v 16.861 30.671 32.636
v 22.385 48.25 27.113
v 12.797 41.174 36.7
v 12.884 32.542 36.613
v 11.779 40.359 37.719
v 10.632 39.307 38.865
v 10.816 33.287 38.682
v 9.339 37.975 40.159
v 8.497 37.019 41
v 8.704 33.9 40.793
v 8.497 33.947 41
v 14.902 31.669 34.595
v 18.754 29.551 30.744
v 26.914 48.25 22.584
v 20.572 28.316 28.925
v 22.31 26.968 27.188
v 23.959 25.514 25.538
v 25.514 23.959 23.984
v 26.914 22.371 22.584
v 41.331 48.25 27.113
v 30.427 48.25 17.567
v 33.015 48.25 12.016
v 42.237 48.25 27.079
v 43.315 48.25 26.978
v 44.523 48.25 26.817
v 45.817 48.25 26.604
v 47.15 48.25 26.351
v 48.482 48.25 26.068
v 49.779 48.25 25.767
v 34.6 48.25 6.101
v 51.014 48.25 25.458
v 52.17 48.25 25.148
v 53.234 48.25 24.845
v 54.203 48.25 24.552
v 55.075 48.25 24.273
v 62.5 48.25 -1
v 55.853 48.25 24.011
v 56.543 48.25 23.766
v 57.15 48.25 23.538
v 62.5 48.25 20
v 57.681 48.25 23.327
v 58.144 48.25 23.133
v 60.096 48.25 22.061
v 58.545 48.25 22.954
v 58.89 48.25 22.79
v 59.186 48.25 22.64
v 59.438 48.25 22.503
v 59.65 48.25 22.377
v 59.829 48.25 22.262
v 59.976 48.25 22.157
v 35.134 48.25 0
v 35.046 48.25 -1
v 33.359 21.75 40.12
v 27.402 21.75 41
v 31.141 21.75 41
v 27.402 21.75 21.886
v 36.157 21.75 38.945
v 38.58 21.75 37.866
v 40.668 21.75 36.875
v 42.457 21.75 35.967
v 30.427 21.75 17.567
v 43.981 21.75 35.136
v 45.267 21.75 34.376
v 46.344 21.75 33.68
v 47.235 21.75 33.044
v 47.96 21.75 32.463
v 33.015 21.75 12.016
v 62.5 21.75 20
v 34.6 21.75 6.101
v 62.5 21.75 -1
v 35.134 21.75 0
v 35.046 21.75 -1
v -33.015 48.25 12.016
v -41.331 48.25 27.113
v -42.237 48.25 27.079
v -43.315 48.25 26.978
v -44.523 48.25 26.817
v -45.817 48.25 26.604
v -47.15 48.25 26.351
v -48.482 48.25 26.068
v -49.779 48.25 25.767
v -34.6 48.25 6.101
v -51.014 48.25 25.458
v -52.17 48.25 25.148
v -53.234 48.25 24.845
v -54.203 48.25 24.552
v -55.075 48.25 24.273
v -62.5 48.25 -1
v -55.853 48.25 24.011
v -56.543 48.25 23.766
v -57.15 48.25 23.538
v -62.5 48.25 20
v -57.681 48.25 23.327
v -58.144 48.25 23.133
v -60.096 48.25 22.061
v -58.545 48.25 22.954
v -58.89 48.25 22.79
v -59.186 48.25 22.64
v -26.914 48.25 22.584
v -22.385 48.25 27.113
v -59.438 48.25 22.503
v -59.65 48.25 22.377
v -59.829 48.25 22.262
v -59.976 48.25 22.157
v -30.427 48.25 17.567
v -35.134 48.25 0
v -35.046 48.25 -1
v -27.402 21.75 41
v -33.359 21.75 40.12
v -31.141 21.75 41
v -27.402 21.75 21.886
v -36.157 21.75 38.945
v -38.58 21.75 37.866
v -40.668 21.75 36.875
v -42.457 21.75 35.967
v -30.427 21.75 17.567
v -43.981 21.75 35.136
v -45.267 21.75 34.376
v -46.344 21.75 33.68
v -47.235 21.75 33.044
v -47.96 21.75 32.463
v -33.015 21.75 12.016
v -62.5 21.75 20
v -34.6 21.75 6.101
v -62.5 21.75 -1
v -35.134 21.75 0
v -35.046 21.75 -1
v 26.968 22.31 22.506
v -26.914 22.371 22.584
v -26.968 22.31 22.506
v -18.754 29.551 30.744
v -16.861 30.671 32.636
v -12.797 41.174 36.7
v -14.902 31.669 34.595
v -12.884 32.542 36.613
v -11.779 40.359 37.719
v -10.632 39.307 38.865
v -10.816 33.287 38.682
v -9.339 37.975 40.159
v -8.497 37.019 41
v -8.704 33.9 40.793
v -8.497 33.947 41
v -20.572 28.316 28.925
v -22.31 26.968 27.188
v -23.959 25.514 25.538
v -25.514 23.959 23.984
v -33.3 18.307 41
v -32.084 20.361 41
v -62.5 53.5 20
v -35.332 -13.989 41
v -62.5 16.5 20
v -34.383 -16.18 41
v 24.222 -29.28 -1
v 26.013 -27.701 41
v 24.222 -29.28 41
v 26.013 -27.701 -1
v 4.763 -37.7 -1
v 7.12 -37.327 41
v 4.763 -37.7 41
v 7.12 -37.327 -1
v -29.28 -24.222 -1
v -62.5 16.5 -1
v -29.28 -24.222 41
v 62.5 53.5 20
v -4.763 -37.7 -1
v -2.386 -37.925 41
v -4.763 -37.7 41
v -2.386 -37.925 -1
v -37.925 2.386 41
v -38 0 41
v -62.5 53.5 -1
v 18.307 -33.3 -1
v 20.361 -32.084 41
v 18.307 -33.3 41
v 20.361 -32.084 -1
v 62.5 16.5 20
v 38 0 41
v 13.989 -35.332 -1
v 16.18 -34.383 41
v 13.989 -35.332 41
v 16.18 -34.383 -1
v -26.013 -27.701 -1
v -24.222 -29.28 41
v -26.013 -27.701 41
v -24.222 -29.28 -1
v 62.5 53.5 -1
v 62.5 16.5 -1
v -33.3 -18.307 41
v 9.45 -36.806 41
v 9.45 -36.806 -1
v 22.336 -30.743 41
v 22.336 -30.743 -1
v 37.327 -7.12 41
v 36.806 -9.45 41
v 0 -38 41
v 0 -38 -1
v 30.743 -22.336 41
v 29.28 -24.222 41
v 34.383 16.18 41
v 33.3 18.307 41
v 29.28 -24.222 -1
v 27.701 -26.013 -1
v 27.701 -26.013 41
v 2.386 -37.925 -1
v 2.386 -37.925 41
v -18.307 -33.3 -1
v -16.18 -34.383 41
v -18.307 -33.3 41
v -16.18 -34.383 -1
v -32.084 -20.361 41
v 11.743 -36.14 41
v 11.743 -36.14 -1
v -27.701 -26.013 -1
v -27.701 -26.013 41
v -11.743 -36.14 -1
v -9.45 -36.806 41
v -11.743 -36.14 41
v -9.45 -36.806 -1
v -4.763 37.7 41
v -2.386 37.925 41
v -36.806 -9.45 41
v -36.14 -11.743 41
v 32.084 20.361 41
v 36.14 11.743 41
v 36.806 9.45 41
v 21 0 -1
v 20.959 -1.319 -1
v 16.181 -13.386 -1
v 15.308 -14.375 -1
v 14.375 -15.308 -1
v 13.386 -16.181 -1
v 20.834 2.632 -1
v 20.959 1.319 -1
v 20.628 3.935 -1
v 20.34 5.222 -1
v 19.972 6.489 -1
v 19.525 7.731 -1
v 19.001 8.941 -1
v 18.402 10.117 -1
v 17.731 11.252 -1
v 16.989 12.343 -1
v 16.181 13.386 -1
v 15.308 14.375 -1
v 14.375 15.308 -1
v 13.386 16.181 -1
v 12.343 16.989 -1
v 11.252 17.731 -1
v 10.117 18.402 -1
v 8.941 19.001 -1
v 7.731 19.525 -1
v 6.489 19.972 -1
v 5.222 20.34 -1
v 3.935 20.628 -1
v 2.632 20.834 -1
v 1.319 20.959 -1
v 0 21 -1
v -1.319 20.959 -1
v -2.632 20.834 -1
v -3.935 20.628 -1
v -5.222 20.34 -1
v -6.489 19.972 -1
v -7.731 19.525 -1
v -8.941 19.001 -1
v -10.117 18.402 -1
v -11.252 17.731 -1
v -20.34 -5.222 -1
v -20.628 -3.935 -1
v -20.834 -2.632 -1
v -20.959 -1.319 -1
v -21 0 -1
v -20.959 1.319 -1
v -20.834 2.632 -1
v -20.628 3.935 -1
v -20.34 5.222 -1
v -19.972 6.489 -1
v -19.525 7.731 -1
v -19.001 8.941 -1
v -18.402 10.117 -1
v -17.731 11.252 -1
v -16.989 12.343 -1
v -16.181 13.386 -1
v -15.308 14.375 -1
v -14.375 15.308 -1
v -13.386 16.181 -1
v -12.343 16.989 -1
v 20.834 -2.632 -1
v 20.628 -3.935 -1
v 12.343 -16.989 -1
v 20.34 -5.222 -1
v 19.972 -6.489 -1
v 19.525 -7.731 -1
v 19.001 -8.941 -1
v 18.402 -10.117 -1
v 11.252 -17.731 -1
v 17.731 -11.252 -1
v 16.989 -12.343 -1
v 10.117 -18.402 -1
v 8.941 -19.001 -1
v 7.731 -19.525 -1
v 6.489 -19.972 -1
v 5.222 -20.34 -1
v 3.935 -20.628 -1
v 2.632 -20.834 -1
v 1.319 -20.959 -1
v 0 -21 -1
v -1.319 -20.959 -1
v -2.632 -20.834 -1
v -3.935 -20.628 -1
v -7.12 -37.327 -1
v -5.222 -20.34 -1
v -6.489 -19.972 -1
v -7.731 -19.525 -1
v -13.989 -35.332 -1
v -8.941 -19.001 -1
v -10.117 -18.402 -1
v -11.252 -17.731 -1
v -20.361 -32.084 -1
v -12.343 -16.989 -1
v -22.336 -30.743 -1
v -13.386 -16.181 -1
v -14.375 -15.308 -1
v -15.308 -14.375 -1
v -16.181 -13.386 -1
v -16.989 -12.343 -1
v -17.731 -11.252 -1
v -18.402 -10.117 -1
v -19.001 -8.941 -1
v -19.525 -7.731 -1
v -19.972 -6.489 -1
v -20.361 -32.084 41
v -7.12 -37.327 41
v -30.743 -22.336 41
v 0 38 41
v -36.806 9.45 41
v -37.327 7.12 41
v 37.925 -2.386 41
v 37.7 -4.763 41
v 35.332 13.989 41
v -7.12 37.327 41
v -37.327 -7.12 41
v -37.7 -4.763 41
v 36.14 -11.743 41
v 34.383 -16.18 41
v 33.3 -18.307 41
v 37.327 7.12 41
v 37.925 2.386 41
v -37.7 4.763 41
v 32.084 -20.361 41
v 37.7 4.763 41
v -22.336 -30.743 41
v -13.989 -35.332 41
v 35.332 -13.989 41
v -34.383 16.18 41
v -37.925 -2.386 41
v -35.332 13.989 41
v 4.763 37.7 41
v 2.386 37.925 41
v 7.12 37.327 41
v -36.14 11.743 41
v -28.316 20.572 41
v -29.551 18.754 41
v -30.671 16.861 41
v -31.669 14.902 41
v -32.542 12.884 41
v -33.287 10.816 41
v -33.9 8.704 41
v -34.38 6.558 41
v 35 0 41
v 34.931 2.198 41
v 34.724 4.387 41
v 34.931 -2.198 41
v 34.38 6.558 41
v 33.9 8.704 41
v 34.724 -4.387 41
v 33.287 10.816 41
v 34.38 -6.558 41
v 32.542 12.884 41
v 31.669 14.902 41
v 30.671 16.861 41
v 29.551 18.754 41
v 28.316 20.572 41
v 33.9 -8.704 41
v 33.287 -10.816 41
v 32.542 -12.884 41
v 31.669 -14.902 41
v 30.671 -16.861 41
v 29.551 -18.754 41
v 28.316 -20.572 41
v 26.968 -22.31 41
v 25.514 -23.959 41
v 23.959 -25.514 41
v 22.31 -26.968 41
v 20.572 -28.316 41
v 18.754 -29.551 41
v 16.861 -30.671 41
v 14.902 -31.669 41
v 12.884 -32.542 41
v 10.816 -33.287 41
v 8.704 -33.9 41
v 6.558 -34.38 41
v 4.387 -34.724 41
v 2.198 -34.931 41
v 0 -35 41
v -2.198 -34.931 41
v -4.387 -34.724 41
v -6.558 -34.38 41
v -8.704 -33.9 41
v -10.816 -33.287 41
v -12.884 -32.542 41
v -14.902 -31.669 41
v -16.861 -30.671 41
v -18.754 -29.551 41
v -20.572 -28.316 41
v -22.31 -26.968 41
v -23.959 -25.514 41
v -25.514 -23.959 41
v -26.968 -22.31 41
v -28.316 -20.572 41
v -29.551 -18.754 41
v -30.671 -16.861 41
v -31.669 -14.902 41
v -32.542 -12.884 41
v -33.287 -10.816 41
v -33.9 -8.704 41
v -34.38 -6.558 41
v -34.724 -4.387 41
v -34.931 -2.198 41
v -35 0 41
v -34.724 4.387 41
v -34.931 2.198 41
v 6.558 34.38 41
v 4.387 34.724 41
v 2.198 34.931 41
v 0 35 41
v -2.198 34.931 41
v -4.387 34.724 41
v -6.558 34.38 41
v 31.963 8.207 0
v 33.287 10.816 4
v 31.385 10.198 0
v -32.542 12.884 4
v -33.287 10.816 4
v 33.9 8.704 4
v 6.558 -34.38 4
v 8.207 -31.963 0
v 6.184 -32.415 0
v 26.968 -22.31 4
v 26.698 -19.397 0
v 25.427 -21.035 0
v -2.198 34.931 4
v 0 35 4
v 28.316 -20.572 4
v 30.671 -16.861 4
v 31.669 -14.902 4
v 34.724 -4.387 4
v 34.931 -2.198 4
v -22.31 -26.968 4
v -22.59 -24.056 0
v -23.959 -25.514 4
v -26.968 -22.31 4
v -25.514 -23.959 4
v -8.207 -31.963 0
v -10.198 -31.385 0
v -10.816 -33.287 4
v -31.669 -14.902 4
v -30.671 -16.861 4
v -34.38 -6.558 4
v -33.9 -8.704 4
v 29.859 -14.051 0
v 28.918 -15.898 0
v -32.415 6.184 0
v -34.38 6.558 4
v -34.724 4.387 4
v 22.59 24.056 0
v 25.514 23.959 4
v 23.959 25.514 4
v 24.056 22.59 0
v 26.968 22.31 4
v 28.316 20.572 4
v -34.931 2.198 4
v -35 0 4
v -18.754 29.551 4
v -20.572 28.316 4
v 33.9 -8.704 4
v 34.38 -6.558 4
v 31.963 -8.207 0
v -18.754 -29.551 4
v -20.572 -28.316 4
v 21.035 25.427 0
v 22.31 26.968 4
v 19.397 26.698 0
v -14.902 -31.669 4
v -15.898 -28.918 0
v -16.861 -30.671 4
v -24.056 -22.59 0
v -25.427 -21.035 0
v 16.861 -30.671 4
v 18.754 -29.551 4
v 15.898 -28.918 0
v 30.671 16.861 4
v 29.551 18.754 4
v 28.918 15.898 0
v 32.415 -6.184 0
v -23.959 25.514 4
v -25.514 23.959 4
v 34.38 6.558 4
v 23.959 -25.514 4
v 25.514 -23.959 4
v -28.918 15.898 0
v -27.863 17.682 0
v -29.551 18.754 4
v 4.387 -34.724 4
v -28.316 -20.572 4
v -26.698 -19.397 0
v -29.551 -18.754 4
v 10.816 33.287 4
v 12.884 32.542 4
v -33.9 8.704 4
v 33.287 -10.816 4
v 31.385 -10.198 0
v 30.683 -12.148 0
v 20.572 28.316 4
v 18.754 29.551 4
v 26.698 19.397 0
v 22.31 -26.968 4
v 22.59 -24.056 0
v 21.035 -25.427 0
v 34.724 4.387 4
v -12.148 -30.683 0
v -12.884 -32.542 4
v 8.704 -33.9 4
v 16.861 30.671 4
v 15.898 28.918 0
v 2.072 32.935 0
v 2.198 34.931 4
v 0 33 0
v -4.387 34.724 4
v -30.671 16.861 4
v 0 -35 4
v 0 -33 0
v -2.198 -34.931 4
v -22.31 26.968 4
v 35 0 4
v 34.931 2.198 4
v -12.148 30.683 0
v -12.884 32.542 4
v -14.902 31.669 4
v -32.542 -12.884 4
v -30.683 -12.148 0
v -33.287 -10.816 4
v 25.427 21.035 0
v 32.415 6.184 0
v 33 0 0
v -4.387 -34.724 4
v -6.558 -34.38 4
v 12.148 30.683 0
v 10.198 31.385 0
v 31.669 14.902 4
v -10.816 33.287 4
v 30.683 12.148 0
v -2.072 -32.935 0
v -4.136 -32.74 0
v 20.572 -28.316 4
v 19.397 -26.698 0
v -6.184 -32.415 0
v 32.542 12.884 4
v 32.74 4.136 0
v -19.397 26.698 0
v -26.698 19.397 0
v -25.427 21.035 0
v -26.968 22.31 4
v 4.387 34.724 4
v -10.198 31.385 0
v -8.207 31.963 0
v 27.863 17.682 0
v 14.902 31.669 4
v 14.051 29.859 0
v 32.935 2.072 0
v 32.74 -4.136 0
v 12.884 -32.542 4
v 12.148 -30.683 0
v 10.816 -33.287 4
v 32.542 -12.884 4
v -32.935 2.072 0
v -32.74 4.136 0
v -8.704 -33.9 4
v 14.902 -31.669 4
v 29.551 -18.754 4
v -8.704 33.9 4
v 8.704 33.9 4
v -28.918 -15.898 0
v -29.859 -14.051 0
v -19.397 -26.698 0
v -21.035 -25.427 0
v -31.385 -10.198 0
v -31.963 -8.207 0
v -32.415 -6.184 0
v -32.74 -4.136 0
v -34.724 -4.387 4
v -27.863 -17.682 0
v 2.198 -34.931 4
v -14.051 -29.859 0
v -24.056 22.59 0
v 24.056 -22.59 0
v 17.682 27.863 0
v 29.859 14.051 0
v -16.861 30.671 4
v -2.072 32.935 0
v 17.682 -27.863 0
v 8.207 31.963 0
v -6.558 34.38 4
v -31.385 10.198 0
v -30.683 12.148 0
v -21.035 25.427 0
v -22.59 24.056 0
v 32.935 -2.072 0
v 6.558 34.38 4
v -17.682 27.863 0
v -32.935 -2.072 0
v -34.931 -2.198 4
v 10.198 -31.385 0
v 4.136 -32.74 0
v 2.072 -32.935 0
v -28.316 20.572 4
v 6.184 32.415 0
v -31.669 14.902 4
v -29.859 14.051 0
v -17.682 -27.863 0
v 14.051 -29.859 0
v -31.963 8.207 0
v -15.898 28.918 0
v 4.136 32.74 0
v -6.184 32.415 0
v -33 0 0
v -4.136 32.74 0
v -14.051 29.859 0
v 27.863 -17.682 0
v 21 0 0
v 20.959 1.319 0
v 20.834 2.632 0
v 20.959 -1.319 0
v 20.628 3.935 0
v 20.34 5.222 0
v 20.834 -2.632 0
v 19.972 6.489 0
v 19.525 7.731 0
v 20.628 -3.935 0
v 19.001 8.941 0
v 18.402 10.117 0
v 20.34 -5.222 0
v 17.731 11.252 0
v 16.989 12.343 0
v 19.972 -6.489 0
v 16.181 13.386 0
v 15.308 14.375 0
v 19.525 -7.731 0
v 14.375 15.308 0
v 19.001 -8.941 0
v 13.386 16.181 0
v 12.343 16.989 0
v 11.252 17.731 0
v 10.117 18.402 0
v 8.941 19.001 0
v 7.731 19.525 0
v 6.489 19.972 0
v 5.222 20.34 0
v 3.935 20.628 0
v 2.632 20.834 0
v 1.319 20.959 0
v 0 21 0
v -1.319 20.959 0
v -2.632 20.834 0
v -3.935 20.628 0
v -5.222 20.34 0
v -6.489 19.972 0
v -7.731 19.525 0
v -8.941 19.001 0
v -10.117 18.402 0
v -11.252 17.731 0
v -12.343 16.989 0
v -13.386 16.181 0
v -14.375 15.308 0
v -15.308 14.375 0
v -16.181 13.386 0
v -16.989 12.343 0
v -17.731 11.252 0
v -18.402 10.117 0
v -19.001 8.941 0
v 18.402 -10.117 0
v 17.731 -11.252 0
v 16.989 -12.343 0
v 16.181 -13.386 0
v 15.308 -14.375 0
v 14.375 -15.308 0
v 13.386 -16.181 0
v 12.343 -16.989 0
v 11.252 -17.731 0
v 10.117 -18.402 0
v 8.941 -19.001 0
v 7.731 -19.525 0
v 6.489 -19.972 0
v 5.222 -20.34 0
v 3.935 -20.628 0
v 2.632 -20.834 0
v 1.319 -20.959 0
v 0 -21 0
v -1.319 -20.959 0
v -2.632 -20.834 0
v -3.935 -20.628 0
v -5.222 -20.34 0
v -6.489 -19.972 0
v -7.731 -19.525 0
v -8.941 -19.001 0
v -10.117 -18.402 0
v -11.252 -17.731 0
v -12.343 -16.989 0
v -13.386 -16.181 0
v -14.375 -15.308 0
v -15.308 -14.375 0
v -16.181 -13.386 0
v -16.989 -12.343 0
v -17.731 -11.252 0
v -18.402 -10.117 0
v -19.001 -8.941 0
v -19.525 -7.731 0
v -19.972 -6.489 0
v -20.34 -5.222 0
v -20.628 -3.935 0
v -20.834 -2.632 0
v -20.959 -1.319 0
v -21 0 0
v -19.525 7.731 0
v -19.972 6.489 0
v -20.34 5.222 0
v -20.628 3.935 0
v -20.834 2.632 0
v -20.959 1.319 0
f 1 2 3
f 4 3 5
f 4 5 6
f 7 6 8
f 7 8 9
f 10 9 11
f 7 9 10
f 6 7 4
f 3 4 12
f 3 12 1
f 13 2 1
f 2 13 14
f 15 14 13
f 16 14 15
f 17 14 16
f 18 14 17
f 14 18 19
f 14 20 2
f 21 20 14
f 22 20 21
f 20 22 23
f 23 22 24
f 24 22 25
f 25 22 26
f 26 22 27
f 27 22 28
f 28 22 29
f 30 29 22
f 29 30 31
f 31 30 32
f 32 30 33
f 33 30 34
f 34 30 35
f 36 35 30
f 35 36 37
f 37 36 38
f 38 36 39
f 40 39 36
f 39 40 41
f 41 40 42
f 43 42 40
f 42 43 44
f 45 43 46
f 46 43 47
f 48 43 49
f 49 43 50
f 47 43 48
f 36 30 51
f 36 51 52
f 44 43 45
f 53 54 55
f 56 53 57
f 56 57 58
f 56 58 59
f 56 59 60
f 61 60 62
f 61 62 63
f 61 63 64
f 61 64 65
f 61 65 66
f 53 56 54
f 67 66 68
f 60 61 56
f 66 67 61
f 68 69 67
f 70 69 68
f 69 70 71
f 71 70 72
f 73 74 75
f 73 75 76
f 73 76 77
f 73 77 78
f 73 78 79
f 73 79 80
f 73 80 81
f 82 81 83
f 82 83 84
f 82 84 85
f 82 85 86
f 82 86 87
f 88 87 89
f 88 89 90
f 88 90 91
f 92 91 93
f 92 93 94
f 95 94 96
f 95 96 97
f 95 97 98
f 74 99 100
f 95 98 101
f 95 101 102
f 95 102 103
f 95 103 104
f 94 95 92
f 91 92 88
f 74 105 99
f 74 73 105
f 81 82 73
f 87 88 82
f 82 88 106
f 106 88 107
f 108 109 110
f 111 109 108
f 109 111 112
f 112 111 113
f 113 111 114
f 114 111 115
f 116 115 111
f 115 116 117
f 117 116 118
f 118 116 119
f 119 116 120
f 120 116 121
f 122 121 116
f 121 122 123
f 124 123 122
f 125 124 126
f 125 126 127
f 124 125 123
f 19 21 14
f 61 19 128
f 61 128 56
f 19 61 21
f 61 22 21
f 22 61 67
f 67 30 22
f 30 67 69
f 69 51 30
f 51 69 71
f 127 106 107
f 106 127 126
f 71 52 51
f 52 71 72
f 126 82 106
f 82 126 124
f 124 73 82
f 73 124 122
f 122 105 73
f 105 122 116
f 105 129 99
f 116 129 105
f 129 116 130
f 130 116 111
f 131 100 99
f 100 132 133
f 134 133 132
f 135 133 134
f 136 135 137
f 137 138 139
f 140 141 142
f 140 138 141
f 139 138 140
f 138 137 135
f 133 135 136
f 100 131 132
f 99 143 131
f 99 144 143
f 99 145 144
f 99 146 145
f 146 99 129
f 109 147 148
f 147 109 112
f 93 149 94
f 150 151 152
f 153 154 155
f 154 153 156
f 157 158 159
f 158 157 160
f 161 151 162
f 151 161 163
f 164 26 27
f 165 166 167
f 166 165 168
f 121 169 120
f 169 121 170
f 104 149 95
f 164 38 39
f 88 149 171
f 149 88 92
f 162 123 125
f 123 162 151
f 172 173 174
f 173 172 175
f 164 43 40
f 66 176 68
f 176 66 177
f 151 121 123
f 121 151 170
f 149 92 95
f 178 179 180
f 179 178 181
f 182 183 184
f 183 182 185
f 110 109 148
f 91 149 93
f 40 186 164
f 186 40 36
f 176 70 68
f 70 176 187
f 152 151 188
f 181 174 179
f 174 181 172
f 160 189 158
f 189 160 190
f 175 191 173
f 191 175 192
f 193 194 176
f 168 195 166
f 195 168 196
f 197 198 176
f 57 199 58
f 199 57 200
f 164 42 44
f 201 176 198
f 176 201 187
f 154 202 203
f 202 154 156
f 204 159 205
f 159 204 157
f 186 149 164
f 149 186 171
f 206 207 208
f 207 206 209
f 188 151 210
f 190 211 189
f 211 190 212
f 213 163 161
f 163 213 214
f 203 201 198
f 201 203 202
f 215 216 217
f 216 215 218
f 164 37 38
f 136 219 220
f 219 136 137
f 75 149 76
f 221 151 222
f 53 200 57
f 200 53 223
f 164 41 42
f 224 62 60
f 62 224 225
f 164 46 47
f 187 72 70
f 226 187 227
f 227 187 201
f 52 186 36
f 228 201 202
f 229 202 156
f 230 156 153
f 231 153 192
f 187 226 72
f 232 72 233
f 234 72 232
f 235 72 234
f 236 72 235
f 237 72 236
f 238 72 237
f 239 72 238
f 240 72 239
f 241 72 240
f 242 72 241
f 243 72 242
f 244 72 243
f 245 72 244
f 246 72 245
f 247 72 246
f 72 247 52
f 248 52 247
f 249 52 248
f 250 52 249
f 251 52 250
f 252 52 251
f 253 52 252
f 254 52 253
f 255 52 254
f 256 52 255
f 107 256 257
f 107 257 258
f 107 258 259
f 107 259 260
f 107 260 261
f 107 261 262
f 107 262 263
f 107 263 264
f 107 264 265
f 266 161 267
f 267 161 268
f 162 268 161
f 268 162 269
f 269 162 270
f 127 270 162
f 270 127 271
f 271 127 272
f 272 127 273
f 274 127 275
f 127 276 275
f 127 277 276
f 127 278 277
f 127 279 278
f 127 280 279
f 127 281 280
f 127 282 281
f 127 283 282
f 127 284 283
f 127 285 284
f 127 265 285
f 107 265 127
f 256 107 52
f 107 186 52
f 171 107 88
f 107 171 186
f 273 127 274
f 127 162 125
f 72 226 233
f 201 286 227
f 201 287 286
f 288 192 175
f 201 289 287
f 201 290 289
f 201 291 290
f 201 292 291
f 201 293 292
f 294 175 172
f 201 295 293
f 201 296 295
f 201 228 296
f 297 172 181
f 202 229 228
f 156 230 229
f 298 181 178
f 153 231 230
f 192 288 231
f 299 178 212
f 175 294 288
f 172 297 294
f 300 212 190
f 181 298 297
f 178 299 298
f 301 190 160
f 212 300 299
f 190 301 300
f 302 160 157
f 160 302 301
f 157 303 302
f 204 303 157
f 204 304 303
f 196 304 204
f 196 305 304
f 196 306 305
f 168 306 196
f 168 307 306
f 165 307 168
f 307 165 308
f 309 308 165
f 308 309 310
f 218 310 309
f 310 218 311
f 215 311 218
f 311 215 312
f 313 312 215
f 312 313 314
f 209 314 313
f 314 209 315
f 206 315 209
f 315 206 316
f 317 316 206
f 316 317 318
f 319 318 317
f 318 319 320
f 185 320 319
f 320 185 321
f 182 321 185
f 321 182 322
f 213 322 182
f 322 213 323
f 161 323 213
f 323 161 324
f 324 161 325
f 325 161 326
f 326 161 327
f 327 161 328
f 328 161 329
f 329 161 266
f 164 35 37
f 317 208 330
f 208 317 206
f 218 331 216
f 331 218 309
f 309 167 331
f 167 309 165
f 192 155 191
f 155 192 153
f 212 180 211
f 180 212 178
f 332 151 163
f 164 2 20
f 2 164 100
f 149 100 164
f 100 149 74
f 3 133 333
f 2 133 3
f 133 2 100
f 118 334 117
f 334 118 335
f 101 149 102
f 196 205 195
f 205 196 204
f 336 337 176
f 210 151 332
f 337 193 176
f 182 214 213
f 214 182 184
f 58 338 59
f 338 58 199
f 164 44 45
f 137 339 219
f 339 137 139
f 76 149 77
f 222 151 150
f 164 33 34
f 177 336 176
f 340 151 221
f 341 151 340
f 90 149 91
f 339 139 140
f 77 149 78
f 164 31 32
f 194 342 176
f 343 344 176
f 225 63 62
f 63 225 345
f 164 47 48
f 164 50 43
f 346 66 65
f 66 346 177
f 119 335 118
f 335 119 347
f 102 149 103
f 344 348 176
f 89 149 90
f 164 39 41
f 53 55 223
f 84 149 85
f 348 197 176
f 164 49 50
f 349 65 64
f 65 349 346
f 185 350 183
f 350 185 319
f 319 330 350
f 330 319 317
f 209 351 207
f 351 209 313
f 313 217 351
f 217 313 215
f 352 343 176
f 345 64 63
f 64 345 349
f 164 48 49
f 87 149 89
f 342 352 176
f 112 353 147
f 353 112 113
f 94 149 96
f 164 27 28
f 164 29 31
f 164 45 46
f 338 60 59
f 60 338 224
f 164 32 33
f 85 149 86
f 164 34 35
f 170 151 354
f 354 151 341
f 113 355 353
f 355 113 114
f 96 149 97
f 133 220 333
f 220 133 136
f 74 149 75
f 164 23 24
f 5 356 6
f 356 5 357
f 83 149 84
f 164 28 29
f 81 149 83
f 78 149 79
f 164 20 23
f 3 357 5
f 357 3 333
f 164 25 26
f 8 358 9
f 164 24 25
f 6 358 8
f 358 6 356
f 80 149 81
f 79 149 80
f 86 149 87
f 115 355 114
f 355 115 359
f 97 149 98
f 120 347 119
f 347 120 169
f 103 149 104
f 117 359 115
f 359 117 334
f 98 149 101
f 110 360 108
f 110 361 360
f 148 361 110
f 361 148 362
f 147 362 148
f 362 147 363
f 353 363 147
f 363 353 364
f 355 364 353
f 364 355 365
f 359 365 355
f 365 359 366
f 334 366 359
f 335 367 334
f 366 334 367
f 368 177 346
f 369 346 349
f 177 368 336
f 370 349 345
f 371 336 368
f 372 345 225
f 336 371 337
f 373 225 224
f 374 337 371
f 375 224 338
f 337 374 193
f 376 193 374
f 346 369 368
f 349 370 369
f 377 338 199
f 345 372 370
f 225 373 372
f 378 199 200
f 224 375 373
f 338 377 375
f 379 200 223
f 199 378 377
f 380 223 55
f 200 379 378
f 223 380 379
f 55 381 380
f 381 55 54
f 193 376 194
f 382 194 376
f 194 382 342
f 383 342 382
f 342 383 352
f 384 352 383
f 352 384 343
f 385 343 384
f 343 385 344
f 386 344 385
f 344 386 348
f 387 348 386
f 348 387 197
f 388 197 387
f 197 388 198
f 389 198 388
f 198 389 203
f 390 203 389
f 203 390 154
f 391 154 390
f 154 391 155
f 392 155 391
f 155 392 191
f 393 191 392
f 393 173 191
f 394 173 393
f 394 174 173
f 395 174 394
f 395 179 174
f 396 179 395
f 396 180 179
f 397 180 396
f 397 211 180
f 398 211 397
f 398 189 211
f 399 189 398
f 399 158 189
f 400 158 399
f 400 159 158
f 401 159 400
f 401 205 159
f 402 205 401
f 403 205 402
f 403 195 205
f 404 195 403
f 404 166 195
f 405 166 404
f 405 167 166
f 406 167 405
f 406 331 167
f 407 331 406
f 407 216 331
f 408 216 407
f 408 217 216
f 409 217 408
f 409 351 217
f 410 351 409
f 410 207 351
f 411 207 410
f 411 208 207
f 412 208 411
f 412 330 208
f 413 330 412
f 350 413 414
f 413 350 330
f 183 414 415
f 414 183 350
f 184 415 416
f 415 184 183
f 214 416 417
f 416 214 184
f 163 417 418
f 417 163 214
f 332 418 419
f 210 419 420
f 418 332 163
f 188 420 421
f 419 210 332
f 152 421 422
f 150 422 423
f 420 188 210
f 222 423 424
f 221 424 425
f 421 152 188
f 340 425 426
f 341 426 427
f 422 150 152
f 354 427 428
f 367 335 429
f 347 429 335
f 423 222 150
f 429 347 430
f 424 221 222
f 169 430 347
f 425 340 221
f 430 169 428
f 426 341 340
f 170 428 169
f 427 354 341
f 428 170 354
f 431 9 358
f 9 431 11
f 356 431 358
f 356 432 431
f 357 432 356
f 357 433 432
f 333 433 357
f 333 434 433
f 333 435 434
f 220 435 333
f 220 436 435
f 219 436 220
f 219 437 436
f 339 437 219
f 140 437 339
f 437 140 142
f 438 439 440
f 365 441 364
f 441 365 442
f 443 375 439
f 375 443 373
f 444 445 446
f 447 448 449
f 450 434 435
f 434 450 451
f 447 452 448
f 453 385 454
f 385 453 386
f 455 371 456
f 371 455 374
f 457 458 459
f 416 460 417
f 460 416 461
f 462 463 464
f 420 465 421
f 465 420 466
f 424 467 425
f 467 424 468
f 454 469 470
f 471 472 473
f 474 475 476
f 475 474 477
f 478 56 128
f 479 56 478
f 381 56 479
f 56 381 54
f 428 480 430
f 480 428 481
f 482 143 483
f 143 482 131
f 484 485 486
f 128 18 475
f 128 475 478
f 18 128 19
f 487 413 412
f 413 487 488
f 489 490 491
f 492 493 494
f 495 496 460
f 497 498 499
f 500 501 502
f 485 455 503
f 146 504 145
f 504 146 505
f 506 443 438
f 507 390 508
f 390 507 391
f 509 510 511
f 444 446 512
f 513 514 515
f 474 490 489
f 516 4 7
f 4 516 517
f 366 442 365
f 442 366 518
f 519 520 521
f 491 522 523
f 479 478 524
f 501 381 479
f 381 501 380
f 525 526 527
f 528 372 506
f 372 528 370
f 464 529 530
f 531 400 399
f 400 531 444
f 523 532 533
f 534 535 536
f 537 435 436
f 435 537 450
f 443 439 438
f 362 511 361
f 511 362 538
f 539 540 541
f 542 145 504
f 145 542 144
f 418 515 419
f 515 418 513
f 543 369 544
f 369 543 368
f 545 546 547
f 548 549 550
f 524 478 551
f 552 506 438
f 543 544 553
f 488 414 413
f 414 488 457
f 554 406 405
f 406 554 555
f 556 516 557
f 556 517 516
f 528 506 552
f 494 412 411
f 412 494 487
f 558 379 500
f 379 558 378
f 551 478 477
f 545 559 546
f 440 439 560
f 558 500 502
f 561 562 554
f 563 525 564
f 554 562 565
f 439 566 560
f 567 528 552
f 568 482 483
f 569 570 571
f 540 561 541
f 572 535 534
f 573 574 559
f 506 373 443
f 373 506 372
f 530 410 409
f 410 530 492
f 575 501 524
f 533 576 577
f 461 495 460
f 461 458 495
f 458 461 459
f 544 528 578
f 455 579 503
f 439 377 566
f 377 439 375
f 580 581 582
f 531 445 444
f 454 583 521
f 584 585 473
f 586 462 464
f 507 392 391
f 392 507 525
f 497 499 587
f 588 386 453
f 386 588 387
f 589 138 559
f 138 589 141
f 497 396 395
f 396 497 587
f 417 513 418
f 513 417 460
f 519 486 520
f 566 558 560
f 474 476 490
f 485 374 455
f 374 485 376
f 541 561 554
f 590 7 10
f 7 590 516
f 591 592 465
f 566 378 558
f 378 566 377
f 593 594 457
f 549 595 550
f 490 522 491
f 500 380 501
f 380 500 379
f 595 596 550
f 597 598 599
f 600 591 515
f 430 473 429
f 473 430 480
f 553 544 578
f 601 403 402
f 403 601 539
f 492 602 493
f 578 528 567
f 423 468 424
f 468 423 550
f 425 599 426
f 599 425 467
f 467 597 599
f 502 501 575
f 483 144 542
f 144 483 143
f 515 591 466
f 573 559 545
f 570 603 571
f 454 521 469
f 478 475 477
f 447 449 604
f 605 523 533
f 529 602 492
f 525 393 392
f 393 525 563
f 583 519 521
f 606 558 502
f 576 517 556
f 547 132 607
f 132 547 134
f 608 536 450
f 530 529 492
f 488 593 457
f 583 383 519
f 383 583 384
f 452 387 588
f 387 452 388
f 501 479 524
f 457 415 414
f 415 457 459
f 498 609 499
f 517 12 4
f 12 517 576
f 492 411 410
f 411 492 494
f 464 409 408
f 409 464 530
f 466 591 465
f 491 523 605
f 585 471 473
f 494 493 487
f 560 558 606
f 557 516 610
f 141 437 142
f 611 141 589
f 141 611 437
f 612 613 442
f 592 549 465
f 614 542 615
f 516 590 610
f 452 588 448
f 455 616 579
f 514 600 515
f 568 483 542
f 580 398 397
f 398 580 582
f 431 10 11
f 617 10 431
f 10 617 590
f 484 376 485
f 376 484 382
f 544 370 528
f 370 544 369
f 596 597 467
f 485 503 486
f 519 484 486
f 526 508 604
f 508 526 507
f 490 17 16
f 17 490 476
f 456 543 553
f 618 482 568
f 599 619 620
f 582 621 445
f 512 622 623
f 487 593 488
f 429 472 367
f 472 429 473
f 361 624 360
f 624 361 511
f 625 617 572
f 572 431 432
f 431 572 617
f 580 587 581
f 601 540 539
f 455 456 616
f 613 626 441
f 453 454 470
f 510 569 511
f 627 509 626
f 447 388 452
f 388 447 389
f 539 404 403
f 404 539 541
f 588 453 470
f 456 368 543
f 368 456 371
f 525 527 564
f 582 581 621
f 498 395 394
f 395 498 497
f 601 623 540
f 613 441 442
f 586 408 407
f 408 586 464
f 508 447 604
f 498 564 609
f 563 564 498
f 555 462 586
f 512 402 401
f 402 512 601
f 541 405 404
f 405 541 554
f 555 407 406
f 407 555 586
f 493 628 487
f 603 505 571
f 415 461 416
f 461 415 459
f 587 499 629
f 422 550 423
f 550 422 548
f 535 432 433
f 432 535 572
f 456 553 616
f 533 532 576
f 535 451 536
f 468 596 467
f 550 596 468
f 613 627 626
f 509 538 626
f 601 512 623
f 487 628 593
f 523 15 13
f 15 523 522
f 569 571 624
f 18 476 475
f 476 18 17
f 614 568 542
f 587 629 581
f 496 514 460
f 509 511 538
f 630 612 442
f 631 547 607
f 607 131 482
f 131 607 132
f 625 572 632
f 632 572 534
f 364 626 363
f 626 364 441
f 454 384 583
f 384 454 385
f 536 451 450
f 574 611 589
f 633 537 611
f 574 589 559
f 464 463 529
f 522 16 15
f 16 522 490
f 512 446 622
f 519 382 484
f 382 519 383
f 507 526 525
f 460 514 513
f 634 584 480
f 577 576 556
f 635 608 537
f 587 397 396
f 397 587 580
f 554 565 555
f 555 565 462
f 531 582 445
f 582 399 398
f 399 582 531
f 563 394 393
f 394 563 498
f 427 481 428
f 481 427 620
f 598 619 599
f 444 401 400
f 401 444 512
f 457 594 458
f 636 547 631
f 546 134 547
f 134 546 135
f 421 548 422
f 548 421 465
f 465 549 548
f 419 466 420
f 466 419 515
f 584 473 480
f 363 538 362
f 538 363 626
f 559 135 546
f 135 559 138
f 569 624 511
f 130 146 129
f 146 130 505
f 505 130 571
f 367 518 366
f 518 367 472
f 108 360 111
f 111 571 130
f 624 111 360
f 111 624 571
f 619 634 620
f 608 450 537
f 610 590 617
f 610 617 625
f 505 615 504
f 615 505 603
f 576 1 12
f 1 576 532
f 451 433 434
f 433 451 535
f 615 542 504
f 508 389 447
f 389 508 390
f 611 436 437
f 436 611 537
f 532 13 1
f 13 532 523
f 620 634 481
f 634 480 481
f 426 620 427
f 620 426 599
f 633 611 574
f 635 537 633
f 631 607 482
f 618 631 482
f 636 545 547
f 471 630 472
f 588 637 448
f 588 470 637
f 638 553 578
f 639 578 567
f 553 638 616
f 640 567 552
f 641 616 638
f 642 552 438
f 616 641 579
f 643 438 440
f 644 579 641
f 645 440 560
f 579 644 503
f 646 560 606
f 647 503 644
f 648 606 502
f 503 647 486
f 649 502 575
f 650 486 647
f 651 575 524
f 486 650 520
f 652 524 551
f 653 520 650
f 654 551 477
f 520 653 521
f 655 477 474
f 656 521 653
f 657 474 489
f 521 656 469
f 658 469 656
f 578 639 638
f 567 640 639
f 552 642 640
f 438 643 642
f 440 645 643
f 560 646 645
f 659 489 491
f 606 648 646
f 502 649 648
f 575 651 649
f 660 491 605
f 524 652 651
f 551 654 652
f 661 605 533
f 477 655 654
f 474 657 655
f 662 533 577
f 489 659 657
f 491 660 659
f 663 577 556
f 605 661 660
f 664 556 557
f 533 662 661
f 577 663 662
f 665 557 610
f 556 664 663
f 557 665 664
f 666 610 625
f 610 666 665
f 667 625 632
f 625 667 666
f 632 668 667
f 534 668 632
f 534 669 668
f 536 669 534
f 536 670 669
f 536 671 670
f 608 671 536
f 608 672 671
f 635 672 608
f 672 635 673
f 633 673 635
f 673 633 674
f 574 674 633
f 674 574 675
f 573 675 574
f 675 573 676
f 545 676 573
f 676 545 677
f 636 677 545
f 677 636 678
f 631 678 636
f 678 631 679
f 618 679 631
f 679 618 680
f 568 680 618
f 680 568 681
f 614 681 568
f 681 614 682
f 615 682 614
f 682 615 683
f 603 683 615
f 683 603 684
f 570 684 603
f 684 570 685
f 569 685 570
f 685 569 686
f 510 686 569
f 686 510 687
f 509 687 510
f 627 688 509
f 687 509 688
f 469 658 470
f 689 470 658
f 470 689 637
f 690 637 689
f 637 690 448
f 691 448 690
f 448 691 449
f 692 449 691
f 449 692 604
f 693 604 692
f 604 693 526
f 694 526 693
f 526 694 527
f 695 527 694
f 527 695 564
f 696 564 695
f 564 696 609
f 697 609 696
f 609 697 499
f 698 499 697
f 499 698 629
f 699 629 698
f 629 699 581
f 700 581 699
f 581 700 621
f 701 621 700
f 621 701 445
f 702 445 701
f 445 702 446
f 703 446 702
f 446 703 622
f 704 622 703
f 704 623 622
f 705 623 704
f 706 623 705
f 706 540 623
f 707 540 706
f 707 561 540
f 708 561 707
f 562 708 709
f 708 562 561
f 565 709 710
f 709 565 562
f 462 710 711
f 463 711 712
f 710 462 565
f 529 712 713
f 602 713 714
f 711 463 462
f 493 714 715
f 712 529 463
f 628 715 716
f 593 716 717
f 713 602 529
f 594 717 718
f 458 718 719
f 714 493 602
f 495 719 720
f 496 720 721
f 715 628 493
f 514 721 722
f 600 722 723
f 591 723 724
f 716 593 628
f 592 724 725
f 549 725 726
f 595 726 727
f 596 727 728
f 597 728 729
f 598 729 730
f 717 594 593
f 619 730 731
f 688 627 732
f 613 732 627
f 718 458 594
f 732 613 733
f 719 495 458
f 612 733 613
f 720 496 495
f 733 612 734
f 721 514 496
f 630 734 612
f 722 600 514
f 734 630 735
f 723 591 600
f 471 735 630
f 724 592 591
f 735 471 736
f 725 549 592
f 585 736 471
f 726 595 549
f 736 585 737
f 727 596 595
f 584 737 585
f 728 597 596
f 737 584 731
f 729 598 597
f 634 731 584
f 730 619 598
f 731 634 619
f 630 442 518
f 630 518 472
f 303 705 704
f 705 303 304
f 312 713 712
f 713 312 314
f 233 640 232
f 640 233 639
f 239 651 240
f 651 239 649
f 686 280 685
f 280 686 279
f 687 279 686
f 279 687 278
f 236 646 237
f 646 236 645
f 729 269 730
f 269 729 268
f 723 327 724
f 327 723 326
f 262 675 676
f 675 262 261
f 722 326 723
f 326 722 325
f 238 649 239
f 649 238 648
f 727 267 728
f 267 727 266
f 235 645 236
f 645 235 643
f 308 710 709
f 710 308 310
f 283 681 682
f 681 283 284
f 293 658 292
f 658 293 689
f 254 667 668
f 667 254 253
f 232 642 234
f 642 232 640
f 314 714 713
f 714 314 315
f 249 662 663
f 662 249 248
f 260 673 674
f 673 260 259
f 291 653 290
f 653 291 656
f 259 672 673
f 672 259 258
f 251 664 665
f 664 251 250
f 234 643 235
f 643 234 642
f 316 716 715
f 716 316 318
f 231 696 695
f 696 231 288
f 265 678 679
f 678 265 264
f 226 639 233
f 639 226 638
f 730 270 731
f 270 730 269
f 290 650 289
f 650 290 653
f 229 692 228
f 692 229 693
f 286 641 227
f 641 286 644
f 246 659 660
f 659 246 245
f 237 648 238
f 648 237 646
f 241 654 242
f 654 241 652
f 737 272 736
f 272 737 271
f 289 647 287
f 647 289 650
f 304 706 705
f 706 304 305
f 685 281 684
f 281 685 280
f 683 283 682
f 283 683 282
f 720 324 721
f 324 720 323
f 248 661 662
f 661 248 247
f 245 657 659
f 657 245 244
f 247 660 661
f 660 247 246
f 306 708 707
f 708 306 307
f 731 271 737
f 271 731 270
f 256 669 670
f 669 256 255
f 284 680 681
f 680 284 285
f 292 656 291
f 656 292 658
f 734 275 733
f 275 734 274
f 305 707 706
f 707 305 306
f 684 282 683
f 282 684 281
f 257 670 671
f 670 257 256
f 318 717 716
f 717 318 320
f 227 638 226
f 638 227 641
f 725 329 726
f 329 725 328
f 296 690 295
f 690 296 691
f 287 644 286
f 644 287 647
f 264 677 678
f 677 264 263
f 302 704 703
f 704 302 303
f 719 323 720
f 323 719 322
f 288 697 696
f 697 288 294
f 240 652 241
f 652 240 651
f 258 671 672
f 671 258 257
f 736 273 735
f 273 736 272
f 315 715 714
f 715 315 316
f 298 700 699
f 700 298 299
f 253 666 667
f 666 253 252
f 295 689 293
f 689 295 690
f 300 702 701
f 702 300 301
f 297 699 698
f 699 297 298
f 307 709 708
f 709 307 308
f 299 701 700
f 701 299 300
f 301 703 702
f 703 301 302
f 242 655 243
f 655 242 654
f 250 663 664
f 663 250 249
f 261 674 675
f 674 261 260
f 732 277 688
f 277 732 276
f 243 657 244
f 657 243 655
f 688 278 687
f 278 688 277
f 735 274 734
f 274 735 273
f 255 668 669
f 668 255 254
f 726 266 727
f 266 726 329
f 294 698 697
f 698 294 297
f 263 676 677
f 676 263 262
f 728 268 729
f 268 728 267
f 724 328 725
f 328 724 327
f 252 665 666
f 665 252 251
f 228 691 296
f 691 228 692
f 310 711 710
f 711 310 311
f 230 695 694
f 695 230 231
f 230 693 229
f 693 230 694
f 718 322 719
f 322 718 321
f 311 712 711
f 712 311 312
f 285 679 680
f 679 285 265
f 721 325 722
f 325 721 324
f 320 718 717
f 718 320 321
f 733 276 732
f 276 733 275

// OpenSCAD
/*

Object Name: Sanatiser Mount On Fence (OpenSCAD)
Author: Brian Khuu 2021

https://www.reddit.com/r/functionalprint/comments/jgg3fk/sanitiser_mount_on_a_fence_openscad/

*/

$fn = 100;

cubetolx = 5;
cubetoly = 1.5;
cubecut = 25; // 2.5cm
cubespacing = 75; // 7.5cm
cubegrip = 3; // 2cm

holderw = cubespacing+cubecut*2;
holderh = 20;

bottlew = 70; // 6.6cm
bottleholderh = 40; // 4cm

mountoffset=0;
wall = 3;

//rotate([0,45,0])
difference()
{
    hull()
    {
        translate([0,0,0-1])
        hull()
        {
            cylinder(h=holderh+1, r=bottlew/2+wall);
            translate([0,bottlew/2-mountoffset,(holderh+1)/2])
                cube([holderw, cubecut+wall*2+cubegrip*2, (holderh+1)], center = true);
        }
        cylinder(h=bottleholderh+1, r=bottlew/2+wall);
    }
    hull()
    {
        translate([0,0,4])
        cylinder(h=bottleholderh+1+1, r=bottlew/2);
        cylinder(h=0.5, r=bottlew/2-2);
    }

    for(deg = [-45 : 10 : +45])
    rotate([0,deg,0])
    union()
    {
        translate([cubespacing/2+cubecut/2,bottlew/2-mountoffset,(holderh+1)/2-1])
            cube([cubecut+cubetolx, cubecut+cubetoly, (holderh+3-1)+10], center = true);
        translate([-cubespacing/2-cubecut/2,bottlew/2-mountoffset,(holderh+1)/2-1])
            cube([cubecut+cubetolx, cubecut+cubetoly, (holderh+3-1)+10], center = true);
    }

    cylinder(h=wall, r=bottlew*0.6/2, center=true);
}


%translate([cubespacing/2+cubecut/2,bottlew/2-mountoffset,(holderh+1)/2-1])
    cube([cubecut, cubecut, (holderh+3-1)+1000], center = true);
%translate([-cubespacing/2-cubecut/2,bottlew/2-mountoffset,(holderh+1)/2-1])
    cube([cubecut, cubecut, (holderh+3-1)+1000], center = true);
